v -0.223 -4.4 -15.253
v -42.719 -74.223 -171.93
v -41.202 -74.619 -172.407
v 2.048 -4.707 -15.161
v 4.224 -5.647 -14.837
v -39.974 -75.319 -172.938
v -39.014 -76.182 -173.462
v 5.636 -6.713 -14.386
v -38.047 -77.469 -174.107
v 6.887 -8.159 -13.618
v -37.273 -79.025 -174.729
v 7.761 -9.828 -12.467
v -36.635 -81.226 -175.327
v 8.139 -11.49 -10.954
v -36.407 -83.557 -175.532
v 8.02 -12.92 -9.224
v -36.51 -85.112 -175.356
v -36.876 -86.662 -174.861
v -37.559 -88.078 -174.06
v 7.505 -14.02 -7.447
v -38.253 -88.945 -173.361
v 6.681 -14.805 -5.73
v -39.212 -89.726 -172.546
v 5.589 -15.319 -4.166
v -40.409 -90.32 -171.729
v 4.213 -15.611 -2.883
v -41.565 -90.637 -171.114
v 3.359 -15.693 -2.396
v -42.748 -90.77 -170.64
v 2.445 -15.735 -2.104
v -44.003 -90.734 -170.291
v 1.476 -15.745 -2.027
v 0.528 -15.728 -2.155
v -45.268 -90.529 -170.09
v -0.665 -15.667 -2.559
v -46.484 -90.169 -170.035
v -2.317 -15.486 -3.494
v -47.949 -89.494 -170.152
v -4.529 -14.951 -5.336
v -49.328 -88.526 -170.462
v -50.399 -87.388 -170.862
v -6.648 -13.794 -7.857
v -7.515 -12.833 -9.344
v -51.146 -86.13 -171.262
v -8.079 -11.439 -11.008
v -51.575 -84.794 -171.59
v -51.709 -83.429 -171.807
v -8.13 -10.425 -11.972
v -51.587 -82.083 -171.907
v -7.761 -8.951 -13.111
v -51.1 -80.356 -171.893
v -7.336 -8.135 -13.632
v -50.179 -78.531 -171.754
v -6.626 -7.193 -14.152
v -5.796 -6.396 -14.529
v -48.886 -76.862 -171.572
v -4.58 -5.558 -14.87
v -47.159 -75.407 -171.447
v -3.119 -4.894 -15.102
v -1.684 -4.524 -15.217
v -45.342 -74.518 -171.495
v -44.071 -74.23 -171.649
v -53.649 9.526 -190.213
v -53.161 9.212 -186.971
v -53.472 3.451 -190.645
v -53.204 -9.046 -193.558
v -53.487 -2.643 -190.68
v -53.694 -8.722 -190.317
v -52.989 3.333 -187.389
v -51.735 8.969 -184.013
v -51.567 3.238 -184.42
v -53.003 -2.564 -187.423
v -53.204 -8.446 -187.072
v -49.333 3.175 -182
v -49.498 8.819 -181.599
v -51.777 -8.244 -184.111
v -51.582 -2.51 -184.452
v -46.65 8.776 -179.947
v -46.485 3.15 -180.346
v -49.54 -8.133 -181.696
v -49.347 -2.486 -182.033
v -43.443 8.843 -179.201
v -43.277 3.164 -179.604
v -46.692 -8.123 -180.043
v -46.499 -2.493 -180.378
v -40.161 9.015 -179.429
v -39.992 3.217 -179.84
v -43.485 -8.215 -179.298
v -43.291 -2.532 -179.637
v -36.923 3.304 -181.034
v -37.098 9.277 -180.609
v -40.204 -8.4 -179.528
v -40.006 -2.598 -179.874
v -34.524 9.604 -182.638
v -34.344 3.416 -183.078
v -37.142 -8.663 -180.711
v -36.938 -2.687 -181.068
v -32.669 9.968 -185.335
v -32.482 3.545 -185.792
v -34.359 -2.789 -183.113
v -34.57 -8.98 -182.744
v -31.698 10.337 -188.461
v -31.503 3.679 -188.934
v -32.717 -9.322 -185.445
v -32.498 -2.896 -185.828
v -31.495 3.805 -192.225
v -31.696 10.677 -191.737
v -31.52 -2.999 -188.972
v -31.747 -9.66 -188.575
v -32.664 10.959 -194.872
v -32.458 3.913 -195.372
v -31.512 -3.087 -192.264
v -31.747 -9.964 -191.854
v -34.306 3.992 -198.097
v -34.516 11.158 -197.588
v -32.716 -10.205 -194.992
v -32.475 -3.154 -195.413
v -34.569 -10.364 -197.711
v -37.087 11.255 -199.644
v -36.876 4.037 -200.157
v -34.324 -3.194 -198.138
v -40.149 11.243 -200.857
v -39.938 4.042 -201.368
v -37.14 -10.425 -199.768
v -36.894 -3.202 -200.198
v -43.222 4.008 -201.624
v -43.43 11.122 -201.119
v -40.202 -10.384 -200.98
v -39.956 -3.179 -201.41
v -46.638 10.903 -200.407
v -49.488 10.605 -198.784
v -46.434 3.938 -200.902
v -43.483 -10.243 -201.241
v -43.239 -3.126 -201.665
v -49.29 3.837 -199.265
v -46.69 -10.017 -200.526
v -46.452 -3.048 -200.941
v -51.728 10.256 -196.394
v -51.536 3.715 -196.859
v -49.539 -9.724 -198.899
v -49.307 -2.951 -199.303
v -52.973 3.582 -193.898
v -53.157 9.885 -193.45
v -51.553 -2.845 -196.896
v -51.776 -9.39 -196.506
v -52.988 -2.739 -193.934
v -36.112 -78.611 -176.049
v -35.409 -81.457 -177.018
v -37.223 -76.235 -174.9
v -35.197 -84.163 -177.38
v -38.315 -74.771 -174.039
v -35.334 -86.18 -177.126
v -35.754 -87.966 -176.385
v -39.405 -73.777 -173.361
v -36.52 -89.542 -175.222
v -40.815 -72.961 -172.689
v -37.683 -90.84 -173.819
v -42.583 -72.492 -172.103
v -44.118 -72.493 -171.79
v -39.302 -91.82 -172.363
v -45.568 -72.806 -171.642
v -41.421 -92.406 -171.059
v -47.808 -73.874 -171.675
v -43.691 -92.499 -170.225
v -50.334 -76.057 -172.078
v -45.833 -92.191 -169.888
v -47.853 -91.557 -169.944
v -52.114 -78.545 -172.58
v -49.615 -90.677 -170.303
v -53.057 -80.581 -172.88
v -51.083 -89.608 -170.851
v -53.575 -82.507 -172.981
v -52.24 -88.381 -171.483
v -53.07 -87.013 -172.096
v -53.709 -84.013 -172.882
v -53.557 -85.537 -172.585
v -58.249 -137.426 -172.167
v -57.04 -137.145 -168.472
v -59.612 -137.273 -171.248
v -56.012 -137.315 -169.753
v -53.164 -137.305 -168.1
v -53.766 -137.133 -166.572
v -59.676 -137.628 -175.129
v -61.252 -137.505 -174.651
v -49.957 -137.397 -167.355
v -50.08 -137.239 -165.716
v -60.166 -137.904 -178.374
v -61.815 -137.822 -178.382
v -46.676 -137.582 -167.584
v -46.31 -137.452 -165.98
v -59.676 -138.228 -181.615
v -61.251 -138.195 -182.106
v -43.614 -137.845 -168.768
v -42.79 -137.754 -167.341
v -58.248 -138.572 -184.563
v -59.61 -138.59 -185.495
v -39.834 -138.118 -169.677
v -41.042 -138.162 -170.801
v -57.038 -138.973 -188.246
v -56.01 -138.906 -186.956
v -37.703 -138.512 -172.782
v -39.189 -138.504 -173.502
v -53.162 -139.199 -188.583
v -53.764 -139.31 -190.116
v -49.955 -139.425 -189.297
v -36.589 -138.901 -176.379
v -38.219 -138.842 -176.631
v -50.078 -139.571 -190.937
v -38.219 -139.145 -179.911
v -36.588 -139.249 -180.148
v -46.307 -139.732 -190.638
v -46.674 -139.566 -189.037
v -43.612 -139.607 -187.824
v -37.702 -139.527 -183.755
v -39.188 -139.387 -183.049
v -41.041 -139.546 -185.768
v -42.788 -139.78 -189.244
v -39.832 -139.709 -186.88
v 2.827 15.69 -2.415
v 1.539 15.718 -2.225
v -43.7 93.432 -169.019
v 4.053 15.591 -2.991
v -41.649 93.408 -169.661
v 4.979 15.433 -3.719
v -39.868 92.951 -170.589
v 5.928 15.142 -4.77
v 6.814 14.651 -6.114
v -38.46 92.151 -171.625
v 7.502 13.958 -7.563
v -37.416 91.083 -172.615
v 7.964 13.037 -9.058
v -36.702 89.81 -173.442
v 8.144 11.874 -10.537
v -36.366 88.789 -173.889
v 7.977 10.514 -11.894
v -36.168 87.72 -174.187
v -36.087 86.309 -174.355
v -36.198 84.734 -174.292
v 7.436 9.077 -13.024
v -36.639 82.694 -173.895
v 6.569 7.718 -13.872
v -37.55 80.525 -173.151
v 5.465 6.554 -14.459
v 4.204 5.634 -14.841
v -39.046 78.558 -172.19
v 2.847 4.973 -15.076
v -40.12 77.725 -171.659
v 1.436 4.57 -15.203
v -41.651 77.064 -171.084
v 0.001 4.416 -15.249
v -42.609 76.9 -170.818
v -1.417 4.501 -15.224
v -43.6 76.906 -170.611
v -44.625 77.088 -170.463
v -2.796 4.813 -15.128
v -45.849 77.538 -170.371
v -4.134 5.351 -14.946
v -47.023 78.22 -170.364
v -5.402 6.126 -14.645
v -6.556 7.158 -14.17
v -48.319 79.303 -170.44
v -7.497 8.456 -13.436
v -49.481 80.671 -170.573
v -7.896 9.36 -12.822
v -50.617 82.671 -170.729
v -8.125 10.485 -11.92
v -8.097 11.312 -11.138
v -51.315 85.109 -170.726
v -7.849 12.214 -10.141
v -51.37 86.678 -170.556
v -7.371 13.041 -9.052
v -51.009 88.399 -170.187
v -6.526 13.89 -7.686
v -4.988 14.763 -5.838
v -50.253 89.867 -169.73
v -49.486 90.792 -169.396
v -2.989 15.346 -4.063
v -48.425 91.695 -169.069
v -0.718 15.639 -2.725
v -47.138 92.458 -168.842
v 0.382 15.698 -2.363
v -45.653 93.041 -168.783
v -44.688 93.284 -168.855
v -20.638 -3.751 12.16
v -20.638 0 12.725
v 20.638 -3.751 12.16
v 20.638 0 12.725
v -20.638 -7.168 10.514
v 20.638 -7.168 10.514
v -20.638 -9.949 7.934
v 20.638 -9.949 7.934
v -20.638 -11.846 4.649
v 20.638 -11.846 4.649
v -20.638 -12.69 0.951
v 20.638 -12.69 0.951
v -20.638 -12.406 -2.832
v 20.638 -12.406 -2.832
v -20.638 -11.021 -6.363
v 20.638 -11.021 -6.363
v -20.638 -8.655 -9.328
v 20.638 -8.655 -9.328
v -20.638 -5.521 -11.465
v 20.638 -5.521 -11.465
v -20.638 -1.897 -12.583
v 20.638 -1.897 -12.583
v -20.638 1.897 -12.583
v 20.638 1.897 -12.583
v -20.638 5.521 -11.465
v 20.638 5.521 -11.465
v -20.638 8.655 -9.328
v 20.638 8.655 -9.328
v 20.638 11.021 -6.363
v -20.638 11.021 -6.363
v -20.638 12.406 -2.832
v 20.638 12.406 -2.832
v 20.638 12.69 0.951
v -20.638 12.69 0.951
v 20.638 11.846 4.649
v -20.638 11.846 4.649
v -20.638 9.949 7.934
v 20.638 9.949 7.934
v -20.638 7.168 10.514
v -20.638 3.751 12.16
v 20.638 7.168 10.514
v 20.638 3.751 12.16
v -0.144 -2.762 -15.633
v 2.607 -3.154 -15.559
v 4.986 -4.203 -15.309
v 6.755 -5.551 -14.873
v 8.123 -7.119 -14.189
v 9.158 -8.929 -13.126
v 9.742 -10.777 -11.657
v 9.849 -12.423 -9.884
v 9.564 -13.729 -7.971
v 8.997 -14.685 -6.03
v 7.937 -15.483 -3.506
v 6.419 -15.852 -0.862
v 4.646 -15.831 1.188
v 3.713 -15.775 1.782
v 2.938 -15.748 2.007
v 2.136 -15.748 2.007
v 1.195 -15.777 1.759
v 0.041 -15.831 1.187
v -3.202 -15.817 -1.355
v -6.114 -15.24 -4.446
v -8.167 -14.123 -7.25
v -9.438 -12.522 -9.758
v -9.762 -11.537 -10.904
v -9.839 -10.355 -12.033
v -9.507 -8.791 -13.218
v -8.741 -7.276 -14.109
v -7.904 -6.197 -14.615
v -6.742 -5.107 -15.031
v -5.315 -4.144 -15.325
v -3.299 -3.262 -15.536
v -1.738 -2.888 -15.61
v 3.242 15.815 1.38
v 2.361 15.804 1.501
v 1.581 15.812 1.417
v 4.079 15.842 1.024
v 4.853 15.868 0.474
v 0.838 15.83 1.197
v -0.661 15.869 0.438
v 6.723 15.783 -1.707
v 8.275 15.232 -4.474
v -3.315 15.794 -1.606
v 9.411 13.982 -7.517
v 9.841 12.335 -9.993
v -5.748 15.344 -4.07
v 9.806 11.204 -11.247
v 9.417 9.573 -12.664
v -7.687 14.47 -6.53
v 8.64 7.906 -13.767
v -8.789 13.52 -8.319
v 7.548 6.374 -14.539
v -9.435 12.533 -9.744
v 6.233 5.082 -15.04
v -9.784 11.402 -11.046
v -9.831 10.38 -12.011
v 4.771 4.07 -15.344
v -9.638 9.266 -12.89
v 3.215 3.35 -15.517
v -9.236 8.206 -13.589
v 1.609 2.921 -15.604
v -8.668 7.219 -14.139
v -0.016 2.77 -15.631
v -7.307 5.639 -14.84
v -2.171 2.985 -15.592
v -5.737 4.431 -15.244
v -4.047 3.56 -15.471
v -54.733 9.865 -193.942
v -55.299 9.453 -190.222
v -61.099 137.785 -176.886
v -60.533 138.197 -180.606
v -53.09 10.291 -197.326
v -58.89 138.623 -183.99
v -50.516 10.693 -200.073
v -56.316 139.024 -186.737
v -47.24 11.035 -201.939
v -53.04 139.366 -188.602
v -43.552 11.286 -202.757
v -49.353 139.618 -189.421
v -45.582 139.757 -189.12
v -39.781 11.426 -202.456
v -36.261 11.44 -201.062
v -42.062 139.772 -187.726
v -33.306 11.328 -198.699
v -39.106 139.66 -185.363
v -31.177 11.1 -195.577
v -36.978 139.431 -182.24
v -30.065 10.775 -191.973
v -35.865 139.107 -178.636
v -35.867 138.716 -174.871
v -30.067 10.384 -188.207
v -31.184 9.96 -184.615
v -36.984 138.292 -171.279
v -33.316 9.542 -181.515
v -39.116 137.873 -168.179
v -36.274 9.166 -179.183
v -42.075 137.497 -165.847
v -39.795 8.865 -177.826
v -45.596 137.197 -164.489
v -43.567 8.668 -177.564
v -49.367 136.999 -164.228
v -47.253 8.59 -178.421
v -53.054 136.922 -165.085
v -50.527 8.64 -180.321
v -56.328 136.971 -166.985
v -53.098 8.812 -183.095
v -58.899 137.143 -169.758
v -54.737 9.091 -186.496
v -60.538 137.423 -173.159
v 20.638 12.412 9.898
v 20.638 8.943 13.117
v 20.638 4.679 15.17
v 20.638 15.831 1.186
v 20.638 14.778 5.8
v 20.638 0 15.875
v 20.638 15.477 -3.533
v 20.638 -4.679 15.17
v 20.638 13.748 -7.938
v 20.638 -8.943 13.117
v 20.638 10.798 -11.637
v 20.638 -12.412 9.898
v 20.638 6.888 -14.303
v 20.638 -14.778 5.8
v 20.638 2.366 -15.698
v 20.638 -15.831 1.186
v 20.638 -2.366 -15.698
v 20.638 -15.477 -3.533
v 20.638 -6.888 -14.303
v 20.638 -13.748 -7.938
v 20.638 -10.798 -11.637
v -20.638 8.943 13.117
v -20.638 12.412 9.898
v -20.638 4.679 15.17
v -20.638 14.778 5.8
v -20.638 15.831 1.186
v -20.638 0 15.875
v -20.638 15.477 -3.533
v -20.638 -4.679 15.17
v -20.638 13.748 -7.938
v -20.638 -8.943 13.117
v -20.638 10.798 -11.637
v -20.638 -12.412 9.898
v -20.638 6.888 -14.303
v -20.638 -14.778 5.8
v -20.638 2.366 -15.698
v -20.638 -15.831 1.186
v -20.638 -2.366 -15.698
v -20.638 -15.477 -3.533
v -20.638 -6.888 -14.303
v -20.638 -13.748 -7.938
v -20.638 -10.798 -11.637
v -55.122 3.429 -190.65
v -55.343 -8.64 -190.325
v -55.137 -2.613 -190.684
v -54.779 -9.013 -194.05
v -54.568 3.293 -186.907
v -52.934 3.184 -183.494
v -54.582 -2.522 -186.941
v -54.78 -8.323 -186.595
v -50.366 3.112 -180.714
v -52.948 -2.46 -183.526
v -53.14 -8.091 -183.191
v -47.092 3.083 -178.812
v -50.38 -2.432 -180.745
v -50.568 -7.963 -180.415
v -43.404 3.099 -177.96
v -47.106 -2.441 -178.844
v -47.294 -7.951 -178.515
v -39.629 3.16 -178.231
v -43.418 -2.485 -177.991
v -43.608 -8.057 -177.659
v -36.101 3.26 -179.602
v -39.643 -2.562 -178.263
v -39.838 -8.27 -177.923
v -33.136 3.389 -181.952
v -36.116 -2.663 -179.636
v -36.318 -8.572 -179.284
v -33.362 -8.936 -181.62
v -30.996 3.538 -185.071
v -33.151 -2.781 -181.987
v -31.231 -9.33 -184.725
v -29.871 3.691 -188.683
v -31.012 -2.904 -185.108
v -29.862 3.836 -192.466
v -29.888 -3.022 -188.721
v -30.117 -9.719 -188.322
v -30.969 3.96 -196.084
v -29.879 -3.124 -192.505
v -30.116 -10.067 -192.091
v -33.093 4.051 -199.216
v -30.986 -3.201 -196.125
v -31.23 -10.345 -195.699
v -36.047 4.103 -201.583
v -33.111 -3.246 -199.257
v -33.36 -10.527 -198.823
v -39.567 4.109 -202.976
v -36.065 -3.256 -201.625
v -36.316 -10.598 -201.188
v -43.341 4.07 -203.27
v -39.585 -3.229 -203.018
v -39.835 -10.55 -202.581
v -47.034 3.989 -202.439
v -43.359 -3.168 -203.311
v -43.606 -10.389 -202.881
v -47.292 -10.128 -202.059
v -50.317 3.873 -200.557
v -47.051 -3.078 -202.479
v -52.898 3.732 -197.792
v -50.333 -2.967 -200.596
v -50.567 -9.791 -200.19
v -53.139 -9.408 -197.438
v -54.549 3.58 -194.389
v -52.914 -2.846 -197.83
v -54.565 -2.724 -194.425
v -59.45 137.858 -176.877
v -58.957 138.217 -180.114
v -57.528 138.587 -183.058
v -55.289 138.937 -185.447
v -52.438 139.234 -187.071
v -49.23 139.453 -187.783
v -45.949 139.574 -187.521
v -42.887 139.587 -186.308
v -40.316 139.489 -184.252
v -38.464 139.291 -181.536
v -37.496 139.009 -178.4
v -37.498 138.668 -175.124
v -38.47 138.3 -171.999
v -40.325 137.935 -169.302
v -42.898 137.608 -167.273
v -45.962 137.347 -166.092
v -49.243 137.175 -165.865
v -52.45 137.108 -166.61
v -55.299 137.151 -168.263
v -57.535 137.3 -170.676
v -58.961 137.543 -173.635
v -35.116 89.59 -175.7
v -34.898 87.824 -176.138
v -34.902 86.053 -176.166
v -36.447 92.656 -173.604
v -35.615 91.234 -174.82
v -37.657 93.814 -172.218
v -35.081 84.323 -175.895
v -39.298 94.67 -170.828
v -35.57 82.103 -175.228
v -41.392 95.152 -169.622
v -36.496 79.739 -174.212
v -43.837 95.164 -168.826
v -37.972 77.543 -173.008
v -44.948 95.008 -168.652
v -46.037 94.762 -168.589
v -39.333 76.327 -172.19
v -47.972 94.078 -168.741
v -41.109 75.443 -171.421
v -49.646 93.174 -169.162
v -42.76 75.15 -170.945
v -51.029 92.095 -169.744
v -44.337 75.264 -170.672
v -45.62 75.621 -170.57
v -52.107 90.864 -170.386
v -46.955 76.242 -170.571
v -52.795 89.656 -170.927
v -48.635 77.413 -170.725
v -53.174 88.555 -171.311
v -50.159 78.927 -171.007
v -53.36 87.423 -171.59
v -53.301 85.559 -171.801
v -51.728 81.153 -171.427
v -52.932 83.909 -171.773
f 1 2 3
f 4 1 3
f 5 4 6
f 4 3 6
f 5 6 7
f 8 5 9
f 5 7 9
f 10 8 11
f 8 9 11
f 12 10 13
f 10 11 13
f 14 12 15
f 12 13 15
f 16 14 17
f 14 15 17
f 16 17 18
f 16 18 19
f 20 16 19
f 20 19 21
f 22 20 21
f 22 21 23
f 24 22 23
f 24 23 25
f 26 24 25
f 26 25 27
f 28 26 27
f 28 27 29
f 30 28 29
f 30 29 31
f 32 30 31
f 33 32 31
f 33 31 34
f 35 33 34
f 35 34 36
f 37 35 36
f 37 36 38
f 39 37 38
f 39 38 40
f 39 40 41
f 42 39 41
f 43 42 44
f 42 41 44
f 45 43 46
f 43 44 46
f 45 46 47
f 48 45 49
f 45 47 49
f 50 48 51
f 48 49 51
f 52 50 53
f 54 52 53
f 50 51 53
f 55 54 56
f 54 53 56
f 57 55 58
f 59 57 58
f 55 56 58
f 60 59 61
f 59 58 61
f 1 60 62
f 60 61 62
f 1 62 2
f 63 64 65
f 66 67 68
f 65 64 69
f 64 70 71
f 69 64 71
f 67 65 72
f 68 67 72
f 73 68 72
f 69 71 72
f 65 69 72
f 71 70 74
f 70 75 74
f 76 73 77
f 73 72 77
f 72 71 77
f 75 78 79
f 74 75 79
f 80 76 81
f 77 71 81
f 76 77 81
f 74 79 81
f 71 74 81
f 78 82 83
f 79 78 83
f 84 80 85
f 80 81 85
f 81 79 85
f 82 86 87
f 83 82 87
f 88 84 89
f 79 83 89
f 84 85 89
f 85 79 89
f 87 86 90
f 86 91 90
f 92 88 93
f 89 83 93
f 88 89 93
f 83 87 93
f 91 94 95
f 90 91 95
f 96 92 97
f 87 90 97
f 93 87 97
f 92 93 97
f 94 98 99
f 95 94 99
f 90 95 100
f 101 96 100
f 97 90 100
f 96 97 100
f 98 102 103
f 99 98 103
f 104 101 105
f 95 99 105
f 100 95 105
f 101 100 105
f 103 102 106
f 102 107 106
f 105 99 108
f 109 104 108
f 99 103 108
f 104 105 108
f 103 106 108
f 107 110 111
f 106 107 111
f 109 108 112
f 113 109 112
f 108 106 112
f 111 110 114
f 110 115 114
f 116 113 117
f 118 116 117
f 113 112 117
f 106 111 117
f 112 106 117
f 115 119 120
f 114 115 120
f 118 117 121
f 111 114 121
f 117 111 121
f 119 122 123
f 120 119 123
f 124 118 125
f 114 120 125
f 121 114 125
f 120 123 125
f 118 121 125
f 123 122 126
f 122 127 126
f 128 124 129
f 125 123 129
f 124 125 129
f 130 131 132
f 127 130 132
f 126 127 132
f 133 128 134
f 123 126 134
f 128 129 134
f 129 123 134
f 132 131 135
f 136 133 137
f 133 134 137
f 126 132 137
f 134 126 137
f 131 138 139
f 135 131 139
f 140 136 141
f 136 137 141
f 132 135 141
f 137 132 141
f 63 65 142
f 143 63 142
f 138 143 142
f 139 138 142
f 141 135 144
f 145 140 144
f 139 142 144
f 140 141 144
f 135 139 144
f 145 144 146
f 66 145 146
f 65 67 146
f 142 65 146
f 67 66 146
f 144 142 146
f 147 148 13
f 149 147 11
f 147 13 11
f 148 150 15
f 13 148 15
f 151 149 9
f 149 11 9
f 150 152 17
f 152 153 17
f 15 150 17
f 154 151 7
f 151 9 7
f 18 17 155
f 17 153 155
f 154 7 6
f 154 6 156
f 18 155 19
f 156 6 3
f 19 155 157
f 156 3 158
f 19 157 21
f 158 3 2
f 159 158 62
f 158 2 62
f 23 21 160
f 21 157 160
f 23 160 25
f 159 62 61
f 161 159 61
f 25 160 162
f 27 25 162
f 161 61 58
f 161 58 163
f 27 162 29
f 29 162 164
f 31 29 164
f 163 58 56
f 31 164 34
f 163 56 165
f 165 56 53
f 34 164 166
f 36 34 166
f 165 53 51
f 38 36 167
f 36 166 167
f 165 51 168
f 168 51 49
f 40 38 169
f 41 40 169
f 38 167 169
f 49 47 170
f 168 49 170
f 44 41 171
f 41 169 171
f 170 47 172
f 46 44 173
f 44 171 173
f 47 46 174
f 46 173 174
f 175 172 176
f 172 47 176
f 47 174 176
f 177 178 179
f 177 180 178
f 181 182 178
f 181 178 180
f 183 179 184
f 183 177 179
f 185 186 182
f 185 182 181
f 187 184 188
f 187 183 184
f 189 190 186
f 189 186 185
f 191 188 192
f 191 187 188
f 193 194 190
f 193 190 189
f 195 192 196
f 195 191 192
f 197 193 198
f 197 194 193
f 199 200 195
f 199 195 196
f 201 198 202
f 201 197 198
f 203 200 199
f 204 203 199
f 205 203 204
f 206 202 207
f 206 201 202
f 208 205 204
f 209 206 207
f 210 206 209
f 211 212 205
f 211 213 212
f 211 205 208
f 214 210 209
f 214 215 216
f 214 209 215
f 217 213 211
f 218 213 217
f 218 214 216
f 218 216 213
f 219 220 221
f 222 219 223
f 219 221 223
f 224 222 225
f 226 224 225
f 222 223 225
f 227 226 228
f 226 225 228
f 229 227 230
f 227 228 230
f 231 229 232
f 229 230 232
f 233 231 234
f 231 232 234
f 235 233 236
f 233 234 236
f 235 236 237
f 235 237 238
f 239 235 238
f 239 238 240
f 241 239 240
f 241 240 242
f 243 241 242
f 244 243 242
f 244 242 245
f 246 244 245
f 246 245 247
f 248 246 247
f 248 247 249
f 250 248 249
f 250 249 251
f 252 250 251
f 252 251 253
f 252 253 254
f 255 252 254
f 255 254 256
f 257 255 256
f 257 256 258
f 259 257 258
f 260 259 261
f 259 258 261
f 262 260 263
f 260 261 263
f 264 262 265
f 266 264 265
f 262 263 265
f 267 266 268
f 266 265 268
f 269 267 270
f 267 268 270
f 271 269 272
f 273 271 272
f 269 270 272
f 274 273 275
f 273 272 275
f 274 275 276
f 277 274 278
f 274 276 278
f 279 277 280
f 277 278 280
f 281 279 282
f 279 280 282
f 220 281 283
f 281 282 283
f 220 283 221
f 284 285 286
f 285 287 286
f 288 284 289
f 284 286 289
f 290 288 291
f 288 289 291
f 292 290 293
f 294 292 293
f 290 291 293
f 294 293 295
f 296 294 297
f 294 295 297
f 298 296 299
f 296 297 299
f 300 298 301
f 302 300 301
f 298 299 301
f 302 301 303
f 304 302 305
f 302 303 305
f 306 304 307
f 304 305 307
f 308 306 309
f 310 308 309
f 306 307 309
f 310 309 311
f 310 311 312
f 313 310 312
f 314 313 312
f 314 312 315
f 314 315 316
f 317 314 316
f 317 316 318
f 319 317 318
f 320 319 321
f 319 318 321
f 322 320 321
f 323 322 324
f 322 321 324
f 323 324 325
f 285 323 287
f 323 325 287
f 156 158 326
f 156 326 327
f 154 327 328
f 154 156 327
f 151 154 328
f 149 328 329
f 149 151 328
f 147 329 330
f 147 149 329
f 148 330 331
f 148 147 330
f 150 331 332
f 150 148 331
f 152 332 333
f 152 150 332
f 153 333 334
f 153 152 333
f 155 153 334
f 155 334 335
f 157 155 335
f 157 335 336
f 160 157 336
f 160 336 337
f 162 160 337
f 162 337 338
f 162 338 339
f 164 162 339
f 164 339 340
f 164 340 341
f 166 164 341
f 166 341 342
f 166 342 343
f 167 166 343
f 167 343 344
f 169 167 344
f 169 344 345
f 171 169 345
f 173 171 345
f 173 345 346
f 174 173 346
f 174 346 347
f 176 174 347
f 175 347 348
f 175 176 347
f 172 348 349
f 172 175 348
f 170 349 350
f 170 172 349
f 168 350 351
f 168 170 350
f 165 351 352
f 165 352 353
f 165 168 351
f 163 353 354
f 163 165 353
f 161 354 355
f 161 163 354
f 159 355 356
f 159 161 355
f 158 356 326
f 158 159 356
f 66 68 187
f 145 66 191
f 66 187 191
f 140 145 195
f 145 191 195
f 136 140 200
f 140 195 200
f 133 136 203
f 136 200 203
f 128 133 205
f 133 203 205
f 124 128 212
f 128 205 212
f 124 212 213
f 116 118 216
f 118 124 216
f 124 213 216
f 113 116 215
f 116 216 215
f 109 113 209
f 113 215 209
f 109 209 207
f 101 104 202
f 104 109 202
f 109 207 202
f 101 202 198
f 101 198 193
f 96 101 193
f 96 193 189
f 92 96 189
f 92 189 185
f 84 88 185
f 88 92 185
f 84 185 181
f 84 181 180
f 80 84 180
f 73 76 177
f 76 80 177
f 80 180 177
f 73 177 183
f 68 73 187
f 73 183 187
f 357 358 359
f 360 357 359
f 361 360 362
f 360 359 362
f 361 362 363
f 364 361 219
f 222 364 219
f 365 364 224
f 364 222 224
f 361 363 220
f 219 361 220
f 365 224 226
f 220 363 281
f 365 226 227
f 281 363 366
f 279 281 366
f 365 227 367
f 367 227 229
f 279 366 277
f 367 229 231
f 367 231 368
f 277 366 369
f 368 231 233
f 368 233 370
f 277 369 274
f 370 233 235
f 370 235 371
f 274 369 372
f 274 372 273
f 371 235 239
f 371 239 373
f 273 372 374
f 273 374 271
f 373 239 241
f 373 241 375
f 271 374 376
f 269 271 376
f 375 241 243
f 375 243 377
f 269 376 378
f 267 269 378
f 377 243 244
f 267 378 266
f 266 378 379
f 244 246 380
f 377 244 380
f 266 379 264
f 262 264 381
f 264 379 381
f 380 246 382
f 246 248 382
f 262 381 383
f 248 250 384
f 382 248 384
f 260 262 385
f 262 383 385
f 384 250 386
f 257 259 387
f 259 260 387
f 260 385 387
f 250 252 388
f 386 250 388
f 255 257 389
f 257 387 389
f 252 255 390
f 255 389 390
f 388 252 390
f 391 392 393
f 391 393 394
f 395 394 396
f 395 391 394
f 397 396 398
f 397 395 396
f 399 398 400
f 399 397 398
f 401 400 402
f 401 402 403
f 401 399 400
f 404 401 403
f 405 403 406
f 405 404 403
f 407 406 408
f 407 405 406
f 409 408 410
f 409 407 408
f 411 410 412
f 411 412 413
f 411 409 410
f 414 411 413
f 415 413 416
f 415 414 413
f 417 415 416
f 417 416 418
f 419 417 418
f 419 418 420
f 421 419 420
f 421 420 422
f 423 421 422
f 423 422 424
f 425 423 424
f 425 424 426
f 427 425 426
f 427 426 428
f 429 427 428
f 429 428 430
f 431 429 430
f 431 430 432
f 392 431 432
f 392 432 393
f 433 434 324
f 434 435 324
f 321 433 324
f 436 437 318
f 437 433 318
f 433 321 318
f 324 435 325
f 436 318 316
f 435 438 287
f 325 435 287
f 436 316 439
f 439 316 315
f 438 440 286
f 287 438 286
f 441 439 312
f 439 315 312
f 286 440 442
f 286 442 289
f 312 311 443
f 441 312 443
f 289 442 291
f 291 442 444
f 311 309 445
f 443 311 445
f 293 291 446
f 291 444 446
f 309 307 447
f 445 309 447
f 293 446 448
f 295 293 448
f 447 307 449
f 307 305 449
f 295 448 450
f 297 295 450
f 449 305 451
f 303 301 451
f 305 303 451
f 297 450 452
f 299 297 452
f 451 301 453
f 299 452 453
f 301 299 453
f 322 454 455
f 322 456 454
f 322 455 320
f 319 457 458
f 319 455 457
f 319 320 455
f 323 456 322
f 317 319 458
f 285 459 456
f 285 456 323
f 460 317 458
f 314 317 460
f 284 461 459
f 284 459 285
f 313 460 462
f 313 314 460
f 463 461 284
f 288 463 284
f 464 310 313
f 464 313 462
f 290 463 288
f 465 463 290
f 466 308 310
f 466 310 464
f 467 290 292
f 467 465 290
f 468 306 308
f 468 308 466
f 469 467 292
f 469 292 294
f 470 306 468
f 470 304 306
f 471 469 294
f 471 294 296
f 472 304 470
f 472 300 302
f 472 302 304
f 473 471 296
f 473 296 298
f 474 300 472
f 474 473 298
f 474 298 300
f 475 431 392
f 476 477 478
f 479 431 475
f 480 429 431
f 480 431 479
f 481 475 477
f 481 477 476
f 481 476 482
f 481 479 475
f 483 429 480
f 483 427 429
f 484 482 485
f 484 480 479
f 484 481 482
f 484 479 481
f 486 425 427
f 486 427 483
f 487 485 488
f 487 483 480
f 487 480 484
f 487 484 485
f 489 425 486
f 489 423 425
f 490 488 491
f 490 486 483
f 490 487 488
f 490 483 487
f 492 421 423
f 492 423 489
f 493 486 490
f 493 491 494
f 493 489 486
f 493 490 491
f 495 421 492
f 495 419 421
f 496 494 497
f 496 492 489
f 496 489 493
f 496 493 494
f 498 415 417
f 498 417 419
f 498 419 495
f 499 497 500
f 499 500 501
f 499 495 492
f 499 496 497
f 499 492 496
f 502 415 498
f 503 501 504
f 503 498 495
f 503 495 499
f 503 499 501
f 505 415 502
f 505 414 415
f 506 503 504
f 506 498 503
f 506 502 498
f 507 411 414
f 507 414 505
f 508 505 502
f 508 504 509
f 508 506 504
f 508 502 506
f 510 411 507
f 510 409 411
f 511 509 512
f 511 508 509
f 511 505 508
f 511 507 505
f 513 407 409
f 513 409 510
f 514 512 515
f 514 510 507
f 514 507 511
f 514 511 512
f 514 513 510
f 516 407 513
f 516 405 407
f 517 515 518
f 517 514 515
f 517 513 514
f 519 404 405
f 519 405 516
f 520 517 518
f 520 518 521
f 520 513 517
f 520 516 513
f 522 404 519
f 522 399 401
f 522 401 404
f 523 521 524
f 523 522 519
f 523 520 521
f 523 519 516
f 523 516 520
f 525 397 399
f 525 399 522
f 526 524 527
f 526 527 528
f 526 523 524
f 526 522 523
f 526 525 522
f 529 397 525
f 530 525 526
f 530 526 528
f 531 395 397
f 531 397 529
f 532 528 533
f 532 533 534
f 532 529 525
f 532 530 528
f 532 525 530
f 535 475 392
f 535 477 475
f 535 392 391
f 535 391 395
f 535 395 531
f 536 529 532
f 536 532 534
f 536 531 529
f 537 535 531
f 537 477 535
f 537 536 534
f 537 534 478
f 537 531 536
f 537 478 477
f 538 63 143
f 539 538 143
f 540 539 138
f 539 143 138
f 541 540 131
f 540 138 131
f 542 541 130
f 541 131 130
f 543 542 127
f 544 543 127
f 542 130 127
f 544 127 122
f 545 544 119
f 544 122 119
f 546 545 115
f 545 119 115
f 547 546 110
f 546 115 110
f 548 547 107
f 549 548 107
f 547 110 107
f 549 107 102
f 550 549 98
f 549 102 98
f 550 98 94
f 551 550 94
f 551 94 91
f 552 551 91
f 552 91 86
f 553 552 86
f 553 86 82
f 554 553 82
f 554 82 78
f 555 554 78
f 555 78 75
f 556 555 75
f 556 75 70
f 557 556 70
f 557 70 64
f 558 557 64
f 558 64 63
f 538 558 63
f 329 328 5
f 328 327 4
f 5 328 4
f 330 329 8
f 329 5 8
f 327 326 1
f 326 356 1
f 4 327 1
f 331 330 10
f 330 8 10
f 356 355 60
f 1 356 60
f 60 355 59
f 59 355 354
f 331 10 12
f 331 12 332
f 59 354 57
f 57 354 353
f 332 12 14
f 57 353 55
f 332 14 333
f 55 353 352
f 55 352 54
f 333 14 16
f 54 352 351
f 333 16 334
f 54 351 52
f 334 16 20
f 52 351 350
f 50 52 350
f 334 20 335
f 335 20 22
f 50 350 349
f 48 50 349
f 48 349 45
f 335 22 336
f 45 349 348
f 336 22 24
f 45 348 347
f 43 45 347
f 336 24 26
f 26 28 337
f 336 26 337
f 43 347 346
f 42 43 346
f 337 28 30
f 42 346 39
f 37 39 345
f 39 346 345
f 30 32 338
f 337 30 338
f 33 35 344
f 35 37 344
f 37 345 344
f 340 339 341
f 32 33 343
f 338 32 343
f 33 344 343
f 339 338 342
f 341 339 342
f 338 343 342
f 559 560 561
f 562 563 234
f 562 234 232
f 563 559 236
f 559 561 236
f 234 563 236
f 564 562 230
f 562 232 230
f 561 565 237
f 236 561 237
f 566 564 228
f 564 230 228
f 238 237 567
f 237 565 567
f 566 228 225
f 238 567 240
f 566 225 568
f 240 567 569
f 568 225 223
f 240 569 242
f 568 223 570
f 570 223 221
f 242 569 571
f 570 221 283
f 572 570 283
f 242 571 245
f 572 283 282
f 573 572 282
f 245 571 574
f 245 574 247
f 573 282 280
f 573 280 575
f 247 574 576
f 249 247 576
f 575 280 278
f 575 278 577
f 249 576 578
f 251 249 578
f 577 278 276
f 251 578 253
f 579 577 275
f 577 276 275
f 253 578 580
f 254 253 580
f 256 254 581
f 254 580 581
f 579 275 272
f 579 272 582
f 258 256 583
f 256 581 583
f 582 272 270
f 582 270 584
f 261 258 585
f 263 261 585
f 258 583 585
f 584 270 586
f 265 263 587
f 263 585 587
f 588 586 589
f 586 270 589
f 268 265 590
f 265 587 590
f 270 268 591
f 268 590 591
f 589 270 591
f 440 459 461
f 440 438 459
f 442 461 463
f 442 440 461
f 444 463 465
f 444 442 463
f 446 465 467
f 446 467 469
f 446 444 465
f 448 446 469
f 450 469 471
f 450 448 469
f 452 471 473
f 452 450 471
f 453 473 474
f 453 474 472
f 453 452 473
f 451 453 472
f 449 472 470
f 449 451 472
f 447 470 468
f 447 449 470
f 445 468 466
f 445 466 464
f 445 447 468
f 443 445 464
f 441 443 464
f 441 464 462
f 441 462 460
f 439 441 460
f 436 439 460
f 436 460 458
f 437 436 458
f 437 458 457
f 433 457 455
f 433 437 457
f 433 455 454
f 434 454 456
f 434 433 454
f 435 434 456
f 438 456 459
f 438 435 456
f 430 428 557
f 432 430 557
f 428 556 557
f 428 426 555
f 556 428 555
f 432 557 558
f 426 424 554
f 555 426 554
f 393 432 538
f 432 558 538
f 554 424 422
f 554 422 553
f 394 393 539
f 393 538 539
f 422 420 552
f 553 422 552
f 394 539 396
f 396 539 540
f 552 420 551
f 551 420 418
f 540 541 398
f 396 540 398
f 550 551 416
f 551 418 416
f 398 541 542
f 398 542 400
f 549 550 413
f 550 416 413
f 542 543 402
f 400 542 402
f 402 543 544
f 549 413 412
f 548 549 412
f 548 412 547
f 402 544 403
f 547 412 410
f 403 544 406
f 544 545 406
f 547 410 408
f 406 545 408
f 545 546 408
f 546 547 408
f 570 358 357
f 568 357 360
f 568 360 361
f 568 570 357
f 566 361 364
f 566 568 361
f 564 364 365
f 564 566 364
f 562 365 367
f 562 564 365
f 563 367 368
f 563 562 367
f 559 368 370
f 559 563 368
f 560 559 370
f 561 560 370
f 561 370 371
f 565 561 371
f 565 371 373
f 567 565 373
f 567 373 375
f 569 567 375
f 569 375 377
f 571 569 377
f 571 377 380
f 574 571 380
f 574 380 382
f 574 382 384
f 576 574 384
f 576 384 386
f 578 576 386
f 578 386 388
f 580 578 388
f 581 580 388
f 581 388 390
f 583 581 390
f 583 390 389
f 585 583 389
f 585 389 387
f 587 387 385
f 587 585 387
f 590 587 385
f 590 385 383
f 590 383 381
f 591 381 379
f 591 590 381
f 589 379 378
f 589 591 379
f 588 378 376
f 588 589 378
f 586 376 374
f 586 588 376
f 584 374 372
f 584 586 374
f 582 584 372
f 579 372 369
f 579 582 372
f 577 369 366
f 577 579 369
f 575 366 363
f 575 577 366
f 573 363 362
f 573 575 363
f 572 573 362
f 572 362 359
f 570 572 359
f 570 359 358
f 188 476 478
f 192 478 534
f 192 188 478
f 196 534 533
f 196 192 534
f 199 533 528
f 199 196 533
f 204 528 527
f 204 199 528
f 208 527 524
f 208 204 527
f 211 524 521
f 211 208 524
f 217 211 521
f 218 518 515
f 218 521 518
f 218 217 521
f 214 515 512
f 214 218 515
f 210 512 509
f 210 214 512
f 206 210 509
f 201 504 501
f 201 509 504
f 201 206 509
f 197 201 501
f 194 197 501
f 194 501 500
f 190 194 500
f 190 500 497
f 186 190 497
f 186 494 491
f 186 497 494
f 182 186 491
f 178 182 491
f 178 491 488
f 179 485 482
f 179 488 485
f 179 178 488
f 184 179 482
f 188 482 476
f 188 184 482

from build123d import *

# Parameters (mm, degrees)
SKETCH6_W                = 41.275
SKETCH6_H                = 3.1496
BOSS_EXTRUDE1_REACH      = 236.297
BOSS_EXTRUDE1_END_RADIUS = 15.875
SKETCH10_R               = 9.525
SKETCH10_R_2             = 7.874
BOSS_EXTRUDE2_REACH      = 283.248
BOSS_EXTRUDE2_END_RADIUS = 15.875
SKETCH11_R               = 9.525
SKETCH11_R_2             = 7.874
SKETCH12_R               = 12.7
SKETCH15_R               = 12.7
SKETCH15_R_2             = 11.049


with BuildPart() as part:
    # Sketch6 → Revolve2 (revolve)
    with BuildSketch(Plane(origin=(0, 0, 0), x_dir=(1, 0, 0), z_dir=(0, 1, 0)), mode=Mode.PRIVATE) as revolve2_sk:
        with Locations((0, 14.3002)):
            Rectangle(SKETCH6_W, SKETCH6_H)
    revolve(revolve2_sk.sketch.rotate(Axis((-66.78681796, 0, 0), (1, 0, 0)), 180), axis=Axis((-66.78681796, 0, 0), (1, 0, 0)))


with BuildPart() as body_2:
    # Boss-Extrude1: up to this cylinder (the profile starts outside it)
    boss_extrude1_end = Plane(origin=(-46.257491, 0, 0), z_dir=(-1, 0, 0)) * Cylinder(BOSS_EXTRUDE1_END_RADIUS, 505.344, mode=Mode.PRIVATE)
    # Sketch10 → Boss-Extrude1 (new, up to the surface)
    with BuildSketch(Plane(origin=(-46.257490993, 90.687540521, -181.772575541), x_dir=(-0.9710805667769234, -0.09902369397430037, 0.2172483391418525), z_dir=(-0.23874419476117373, 0.4101204671704958, -0.8802286134156814)), mode=Mode.PRIVATE) as boss_extrude1_sk1:
        with Locations(Location((0, 0, 0), (0, 0, 89.885860526))):
            Circle(SKETCH10_R)
        with Locations(Location((0, 0, 0), (0, 0, 89.885860526))):
            Circle(SKETCH10_R_2, mode=Mode.SUBTRACT)
    boss_extrude1_tool1 = extrude(boss_extrude1_sk1.sketch, amount=-BOSS_EXTRUDE1_REACH, mode=Mode.PRIVATE) - boss_extrude1_end
    add(boss_extrude1_tool1.solids().sort_by_distance((-46.257491, 82.297896, -185.68152))[0])


with BuildPart() as body_3:
    # Boss-Extrude2: up to this cylinder (the profile starts outside it)
    boss_extrude2_end = Plane(origin=(-46.59229, 0, 0), z_dir=(-1, 0, 0)) * Cylinder(BOSS_EXTRUDE2_END_RADIUS, 599.246, mode=Mode.PRIVATE)
    # Sketch11 → Boss-Extrude2 (new, up to the surface)
    with BuildSketch(Plane(origin=(-46.592290414, -87.779849456, -183.006951233), x_dir=(-0.9706542952078342, 0.09961561790365697, 0.21887660419573265), z_dir=(-0.24047216176870762, -0.3951132900155316, -0.8865994740960469)), mode=Mode.PRIVATE) as boss_extrude2_sk1:
        with Locations(Location((0, 0, 0), (0, 0, 89.891500811))):
            Circle(SKETCH11_R)
        with Locations(Location((0, 0, 0), (0, 0, 89.891500811))):
            Circle(SKETCH11_R_2, mode=Mode.SUBTRACT)
    boss_extrude2_tool1 = extrude(boss_extrude2_sk1.sketch, amount=-BOSS_EXTRUDE2_REACH, mode=Mode.PRIVATE) - boss_extrude2_end
    add(boss_extrude2_tool1.solids().sort_by_distance((-46.59229, -96.233929, -179.239388))[0])


with BuildPart() as cut_sweep1_tool:
    # Cut-Sweep1: sweep along a curve in space
    with BuildLine() as cut_sweep1_path:
        Line((-48.411844599, 138.351090877, -176.819338526), (-42.611355849, 10.019378374, -190.15568011))
        ThreePointArc((-42.611355849, 10.019378374, -190.15568011), (-42.406082457, 0.376838357, -190.682639824), (-42.659018694, -9.269942166, -190.265446224))
        Line((-42.659018694, -9.269942166, -190.265446224), (-49.130913586, -138.45193213, -178.322153213))
    # Sketch12 → Cut-Sweep1 (sweep)
    with BuildSketch(Plane(origin=(-49.130913586, -138.45193213, -178.322153213), x_dir=(-0.9987579915812498, 0.049603819400959905, -0.004683519341809774), z_dir=(-0.049824339966109084, -0.9945166744943245, 0.09194628486073564))):
        Circle(SKETCH12_R)
    sweep(path=cut_sweep1_path.line)


with BuildPart() as body_2_1:
    add(body_2.part)

    # Cut-Sweep1: cut by cut_sweep1_tool
    add(cut_sweep1_tool.part, mode=Mode.SUBTRACT)


with BuildPart() as body_3_1:
    add(body_3.part)

    # Cut-Sweep1: cut by cut_sweep1_tool
    add(cut_sweep1_tool.part, mode=Mode.SUBTRACT)


with BuildPart() as body_4:
    # Sweep2: sweep along a path in Sketch14
    with BuildLine(Plane(origin=(-109.219490339, 0.571489784, -53.003043086), x_dir=(0.4365945323887518, 5.986852696490802e-08, -0.8996583875495429), z_dir=(0.899648419573701, -0.004707400477552739, 0.43658969472410386))) as sweep2_path:
        Line((137.940662614, 137.781119432), (152.47126817, 9.447984144))
        ThreePointArc((152.47126817, 9.447984144), (153.03497256, -0.194662746), (152.549209682, -9.841550126))
        Line((152.549209682, -9.841550126), (138.978724292, -139.024970613))
    # Sketch15 → Sweep2 (sweep)
    with BuildSketch(Plane(origin=(-49.130913586, -138.45193213, -178.322153213), x_dir=(-0.9987579915812498, 0.049603819400959905, -0.004683519341809774), z_dir=(-0.049824339966109084, -0.9945166744943245, 0.09194628486073564))):
        Circle(SKETCH15_R)
        Circle(SKETCH15_R_2, mode=Mode.SUBTRACT)
    sweep(path=sweep2_path.line)


solid = Compound([part.part, body_2_1.part, body_3_1.part, body_4.part])
